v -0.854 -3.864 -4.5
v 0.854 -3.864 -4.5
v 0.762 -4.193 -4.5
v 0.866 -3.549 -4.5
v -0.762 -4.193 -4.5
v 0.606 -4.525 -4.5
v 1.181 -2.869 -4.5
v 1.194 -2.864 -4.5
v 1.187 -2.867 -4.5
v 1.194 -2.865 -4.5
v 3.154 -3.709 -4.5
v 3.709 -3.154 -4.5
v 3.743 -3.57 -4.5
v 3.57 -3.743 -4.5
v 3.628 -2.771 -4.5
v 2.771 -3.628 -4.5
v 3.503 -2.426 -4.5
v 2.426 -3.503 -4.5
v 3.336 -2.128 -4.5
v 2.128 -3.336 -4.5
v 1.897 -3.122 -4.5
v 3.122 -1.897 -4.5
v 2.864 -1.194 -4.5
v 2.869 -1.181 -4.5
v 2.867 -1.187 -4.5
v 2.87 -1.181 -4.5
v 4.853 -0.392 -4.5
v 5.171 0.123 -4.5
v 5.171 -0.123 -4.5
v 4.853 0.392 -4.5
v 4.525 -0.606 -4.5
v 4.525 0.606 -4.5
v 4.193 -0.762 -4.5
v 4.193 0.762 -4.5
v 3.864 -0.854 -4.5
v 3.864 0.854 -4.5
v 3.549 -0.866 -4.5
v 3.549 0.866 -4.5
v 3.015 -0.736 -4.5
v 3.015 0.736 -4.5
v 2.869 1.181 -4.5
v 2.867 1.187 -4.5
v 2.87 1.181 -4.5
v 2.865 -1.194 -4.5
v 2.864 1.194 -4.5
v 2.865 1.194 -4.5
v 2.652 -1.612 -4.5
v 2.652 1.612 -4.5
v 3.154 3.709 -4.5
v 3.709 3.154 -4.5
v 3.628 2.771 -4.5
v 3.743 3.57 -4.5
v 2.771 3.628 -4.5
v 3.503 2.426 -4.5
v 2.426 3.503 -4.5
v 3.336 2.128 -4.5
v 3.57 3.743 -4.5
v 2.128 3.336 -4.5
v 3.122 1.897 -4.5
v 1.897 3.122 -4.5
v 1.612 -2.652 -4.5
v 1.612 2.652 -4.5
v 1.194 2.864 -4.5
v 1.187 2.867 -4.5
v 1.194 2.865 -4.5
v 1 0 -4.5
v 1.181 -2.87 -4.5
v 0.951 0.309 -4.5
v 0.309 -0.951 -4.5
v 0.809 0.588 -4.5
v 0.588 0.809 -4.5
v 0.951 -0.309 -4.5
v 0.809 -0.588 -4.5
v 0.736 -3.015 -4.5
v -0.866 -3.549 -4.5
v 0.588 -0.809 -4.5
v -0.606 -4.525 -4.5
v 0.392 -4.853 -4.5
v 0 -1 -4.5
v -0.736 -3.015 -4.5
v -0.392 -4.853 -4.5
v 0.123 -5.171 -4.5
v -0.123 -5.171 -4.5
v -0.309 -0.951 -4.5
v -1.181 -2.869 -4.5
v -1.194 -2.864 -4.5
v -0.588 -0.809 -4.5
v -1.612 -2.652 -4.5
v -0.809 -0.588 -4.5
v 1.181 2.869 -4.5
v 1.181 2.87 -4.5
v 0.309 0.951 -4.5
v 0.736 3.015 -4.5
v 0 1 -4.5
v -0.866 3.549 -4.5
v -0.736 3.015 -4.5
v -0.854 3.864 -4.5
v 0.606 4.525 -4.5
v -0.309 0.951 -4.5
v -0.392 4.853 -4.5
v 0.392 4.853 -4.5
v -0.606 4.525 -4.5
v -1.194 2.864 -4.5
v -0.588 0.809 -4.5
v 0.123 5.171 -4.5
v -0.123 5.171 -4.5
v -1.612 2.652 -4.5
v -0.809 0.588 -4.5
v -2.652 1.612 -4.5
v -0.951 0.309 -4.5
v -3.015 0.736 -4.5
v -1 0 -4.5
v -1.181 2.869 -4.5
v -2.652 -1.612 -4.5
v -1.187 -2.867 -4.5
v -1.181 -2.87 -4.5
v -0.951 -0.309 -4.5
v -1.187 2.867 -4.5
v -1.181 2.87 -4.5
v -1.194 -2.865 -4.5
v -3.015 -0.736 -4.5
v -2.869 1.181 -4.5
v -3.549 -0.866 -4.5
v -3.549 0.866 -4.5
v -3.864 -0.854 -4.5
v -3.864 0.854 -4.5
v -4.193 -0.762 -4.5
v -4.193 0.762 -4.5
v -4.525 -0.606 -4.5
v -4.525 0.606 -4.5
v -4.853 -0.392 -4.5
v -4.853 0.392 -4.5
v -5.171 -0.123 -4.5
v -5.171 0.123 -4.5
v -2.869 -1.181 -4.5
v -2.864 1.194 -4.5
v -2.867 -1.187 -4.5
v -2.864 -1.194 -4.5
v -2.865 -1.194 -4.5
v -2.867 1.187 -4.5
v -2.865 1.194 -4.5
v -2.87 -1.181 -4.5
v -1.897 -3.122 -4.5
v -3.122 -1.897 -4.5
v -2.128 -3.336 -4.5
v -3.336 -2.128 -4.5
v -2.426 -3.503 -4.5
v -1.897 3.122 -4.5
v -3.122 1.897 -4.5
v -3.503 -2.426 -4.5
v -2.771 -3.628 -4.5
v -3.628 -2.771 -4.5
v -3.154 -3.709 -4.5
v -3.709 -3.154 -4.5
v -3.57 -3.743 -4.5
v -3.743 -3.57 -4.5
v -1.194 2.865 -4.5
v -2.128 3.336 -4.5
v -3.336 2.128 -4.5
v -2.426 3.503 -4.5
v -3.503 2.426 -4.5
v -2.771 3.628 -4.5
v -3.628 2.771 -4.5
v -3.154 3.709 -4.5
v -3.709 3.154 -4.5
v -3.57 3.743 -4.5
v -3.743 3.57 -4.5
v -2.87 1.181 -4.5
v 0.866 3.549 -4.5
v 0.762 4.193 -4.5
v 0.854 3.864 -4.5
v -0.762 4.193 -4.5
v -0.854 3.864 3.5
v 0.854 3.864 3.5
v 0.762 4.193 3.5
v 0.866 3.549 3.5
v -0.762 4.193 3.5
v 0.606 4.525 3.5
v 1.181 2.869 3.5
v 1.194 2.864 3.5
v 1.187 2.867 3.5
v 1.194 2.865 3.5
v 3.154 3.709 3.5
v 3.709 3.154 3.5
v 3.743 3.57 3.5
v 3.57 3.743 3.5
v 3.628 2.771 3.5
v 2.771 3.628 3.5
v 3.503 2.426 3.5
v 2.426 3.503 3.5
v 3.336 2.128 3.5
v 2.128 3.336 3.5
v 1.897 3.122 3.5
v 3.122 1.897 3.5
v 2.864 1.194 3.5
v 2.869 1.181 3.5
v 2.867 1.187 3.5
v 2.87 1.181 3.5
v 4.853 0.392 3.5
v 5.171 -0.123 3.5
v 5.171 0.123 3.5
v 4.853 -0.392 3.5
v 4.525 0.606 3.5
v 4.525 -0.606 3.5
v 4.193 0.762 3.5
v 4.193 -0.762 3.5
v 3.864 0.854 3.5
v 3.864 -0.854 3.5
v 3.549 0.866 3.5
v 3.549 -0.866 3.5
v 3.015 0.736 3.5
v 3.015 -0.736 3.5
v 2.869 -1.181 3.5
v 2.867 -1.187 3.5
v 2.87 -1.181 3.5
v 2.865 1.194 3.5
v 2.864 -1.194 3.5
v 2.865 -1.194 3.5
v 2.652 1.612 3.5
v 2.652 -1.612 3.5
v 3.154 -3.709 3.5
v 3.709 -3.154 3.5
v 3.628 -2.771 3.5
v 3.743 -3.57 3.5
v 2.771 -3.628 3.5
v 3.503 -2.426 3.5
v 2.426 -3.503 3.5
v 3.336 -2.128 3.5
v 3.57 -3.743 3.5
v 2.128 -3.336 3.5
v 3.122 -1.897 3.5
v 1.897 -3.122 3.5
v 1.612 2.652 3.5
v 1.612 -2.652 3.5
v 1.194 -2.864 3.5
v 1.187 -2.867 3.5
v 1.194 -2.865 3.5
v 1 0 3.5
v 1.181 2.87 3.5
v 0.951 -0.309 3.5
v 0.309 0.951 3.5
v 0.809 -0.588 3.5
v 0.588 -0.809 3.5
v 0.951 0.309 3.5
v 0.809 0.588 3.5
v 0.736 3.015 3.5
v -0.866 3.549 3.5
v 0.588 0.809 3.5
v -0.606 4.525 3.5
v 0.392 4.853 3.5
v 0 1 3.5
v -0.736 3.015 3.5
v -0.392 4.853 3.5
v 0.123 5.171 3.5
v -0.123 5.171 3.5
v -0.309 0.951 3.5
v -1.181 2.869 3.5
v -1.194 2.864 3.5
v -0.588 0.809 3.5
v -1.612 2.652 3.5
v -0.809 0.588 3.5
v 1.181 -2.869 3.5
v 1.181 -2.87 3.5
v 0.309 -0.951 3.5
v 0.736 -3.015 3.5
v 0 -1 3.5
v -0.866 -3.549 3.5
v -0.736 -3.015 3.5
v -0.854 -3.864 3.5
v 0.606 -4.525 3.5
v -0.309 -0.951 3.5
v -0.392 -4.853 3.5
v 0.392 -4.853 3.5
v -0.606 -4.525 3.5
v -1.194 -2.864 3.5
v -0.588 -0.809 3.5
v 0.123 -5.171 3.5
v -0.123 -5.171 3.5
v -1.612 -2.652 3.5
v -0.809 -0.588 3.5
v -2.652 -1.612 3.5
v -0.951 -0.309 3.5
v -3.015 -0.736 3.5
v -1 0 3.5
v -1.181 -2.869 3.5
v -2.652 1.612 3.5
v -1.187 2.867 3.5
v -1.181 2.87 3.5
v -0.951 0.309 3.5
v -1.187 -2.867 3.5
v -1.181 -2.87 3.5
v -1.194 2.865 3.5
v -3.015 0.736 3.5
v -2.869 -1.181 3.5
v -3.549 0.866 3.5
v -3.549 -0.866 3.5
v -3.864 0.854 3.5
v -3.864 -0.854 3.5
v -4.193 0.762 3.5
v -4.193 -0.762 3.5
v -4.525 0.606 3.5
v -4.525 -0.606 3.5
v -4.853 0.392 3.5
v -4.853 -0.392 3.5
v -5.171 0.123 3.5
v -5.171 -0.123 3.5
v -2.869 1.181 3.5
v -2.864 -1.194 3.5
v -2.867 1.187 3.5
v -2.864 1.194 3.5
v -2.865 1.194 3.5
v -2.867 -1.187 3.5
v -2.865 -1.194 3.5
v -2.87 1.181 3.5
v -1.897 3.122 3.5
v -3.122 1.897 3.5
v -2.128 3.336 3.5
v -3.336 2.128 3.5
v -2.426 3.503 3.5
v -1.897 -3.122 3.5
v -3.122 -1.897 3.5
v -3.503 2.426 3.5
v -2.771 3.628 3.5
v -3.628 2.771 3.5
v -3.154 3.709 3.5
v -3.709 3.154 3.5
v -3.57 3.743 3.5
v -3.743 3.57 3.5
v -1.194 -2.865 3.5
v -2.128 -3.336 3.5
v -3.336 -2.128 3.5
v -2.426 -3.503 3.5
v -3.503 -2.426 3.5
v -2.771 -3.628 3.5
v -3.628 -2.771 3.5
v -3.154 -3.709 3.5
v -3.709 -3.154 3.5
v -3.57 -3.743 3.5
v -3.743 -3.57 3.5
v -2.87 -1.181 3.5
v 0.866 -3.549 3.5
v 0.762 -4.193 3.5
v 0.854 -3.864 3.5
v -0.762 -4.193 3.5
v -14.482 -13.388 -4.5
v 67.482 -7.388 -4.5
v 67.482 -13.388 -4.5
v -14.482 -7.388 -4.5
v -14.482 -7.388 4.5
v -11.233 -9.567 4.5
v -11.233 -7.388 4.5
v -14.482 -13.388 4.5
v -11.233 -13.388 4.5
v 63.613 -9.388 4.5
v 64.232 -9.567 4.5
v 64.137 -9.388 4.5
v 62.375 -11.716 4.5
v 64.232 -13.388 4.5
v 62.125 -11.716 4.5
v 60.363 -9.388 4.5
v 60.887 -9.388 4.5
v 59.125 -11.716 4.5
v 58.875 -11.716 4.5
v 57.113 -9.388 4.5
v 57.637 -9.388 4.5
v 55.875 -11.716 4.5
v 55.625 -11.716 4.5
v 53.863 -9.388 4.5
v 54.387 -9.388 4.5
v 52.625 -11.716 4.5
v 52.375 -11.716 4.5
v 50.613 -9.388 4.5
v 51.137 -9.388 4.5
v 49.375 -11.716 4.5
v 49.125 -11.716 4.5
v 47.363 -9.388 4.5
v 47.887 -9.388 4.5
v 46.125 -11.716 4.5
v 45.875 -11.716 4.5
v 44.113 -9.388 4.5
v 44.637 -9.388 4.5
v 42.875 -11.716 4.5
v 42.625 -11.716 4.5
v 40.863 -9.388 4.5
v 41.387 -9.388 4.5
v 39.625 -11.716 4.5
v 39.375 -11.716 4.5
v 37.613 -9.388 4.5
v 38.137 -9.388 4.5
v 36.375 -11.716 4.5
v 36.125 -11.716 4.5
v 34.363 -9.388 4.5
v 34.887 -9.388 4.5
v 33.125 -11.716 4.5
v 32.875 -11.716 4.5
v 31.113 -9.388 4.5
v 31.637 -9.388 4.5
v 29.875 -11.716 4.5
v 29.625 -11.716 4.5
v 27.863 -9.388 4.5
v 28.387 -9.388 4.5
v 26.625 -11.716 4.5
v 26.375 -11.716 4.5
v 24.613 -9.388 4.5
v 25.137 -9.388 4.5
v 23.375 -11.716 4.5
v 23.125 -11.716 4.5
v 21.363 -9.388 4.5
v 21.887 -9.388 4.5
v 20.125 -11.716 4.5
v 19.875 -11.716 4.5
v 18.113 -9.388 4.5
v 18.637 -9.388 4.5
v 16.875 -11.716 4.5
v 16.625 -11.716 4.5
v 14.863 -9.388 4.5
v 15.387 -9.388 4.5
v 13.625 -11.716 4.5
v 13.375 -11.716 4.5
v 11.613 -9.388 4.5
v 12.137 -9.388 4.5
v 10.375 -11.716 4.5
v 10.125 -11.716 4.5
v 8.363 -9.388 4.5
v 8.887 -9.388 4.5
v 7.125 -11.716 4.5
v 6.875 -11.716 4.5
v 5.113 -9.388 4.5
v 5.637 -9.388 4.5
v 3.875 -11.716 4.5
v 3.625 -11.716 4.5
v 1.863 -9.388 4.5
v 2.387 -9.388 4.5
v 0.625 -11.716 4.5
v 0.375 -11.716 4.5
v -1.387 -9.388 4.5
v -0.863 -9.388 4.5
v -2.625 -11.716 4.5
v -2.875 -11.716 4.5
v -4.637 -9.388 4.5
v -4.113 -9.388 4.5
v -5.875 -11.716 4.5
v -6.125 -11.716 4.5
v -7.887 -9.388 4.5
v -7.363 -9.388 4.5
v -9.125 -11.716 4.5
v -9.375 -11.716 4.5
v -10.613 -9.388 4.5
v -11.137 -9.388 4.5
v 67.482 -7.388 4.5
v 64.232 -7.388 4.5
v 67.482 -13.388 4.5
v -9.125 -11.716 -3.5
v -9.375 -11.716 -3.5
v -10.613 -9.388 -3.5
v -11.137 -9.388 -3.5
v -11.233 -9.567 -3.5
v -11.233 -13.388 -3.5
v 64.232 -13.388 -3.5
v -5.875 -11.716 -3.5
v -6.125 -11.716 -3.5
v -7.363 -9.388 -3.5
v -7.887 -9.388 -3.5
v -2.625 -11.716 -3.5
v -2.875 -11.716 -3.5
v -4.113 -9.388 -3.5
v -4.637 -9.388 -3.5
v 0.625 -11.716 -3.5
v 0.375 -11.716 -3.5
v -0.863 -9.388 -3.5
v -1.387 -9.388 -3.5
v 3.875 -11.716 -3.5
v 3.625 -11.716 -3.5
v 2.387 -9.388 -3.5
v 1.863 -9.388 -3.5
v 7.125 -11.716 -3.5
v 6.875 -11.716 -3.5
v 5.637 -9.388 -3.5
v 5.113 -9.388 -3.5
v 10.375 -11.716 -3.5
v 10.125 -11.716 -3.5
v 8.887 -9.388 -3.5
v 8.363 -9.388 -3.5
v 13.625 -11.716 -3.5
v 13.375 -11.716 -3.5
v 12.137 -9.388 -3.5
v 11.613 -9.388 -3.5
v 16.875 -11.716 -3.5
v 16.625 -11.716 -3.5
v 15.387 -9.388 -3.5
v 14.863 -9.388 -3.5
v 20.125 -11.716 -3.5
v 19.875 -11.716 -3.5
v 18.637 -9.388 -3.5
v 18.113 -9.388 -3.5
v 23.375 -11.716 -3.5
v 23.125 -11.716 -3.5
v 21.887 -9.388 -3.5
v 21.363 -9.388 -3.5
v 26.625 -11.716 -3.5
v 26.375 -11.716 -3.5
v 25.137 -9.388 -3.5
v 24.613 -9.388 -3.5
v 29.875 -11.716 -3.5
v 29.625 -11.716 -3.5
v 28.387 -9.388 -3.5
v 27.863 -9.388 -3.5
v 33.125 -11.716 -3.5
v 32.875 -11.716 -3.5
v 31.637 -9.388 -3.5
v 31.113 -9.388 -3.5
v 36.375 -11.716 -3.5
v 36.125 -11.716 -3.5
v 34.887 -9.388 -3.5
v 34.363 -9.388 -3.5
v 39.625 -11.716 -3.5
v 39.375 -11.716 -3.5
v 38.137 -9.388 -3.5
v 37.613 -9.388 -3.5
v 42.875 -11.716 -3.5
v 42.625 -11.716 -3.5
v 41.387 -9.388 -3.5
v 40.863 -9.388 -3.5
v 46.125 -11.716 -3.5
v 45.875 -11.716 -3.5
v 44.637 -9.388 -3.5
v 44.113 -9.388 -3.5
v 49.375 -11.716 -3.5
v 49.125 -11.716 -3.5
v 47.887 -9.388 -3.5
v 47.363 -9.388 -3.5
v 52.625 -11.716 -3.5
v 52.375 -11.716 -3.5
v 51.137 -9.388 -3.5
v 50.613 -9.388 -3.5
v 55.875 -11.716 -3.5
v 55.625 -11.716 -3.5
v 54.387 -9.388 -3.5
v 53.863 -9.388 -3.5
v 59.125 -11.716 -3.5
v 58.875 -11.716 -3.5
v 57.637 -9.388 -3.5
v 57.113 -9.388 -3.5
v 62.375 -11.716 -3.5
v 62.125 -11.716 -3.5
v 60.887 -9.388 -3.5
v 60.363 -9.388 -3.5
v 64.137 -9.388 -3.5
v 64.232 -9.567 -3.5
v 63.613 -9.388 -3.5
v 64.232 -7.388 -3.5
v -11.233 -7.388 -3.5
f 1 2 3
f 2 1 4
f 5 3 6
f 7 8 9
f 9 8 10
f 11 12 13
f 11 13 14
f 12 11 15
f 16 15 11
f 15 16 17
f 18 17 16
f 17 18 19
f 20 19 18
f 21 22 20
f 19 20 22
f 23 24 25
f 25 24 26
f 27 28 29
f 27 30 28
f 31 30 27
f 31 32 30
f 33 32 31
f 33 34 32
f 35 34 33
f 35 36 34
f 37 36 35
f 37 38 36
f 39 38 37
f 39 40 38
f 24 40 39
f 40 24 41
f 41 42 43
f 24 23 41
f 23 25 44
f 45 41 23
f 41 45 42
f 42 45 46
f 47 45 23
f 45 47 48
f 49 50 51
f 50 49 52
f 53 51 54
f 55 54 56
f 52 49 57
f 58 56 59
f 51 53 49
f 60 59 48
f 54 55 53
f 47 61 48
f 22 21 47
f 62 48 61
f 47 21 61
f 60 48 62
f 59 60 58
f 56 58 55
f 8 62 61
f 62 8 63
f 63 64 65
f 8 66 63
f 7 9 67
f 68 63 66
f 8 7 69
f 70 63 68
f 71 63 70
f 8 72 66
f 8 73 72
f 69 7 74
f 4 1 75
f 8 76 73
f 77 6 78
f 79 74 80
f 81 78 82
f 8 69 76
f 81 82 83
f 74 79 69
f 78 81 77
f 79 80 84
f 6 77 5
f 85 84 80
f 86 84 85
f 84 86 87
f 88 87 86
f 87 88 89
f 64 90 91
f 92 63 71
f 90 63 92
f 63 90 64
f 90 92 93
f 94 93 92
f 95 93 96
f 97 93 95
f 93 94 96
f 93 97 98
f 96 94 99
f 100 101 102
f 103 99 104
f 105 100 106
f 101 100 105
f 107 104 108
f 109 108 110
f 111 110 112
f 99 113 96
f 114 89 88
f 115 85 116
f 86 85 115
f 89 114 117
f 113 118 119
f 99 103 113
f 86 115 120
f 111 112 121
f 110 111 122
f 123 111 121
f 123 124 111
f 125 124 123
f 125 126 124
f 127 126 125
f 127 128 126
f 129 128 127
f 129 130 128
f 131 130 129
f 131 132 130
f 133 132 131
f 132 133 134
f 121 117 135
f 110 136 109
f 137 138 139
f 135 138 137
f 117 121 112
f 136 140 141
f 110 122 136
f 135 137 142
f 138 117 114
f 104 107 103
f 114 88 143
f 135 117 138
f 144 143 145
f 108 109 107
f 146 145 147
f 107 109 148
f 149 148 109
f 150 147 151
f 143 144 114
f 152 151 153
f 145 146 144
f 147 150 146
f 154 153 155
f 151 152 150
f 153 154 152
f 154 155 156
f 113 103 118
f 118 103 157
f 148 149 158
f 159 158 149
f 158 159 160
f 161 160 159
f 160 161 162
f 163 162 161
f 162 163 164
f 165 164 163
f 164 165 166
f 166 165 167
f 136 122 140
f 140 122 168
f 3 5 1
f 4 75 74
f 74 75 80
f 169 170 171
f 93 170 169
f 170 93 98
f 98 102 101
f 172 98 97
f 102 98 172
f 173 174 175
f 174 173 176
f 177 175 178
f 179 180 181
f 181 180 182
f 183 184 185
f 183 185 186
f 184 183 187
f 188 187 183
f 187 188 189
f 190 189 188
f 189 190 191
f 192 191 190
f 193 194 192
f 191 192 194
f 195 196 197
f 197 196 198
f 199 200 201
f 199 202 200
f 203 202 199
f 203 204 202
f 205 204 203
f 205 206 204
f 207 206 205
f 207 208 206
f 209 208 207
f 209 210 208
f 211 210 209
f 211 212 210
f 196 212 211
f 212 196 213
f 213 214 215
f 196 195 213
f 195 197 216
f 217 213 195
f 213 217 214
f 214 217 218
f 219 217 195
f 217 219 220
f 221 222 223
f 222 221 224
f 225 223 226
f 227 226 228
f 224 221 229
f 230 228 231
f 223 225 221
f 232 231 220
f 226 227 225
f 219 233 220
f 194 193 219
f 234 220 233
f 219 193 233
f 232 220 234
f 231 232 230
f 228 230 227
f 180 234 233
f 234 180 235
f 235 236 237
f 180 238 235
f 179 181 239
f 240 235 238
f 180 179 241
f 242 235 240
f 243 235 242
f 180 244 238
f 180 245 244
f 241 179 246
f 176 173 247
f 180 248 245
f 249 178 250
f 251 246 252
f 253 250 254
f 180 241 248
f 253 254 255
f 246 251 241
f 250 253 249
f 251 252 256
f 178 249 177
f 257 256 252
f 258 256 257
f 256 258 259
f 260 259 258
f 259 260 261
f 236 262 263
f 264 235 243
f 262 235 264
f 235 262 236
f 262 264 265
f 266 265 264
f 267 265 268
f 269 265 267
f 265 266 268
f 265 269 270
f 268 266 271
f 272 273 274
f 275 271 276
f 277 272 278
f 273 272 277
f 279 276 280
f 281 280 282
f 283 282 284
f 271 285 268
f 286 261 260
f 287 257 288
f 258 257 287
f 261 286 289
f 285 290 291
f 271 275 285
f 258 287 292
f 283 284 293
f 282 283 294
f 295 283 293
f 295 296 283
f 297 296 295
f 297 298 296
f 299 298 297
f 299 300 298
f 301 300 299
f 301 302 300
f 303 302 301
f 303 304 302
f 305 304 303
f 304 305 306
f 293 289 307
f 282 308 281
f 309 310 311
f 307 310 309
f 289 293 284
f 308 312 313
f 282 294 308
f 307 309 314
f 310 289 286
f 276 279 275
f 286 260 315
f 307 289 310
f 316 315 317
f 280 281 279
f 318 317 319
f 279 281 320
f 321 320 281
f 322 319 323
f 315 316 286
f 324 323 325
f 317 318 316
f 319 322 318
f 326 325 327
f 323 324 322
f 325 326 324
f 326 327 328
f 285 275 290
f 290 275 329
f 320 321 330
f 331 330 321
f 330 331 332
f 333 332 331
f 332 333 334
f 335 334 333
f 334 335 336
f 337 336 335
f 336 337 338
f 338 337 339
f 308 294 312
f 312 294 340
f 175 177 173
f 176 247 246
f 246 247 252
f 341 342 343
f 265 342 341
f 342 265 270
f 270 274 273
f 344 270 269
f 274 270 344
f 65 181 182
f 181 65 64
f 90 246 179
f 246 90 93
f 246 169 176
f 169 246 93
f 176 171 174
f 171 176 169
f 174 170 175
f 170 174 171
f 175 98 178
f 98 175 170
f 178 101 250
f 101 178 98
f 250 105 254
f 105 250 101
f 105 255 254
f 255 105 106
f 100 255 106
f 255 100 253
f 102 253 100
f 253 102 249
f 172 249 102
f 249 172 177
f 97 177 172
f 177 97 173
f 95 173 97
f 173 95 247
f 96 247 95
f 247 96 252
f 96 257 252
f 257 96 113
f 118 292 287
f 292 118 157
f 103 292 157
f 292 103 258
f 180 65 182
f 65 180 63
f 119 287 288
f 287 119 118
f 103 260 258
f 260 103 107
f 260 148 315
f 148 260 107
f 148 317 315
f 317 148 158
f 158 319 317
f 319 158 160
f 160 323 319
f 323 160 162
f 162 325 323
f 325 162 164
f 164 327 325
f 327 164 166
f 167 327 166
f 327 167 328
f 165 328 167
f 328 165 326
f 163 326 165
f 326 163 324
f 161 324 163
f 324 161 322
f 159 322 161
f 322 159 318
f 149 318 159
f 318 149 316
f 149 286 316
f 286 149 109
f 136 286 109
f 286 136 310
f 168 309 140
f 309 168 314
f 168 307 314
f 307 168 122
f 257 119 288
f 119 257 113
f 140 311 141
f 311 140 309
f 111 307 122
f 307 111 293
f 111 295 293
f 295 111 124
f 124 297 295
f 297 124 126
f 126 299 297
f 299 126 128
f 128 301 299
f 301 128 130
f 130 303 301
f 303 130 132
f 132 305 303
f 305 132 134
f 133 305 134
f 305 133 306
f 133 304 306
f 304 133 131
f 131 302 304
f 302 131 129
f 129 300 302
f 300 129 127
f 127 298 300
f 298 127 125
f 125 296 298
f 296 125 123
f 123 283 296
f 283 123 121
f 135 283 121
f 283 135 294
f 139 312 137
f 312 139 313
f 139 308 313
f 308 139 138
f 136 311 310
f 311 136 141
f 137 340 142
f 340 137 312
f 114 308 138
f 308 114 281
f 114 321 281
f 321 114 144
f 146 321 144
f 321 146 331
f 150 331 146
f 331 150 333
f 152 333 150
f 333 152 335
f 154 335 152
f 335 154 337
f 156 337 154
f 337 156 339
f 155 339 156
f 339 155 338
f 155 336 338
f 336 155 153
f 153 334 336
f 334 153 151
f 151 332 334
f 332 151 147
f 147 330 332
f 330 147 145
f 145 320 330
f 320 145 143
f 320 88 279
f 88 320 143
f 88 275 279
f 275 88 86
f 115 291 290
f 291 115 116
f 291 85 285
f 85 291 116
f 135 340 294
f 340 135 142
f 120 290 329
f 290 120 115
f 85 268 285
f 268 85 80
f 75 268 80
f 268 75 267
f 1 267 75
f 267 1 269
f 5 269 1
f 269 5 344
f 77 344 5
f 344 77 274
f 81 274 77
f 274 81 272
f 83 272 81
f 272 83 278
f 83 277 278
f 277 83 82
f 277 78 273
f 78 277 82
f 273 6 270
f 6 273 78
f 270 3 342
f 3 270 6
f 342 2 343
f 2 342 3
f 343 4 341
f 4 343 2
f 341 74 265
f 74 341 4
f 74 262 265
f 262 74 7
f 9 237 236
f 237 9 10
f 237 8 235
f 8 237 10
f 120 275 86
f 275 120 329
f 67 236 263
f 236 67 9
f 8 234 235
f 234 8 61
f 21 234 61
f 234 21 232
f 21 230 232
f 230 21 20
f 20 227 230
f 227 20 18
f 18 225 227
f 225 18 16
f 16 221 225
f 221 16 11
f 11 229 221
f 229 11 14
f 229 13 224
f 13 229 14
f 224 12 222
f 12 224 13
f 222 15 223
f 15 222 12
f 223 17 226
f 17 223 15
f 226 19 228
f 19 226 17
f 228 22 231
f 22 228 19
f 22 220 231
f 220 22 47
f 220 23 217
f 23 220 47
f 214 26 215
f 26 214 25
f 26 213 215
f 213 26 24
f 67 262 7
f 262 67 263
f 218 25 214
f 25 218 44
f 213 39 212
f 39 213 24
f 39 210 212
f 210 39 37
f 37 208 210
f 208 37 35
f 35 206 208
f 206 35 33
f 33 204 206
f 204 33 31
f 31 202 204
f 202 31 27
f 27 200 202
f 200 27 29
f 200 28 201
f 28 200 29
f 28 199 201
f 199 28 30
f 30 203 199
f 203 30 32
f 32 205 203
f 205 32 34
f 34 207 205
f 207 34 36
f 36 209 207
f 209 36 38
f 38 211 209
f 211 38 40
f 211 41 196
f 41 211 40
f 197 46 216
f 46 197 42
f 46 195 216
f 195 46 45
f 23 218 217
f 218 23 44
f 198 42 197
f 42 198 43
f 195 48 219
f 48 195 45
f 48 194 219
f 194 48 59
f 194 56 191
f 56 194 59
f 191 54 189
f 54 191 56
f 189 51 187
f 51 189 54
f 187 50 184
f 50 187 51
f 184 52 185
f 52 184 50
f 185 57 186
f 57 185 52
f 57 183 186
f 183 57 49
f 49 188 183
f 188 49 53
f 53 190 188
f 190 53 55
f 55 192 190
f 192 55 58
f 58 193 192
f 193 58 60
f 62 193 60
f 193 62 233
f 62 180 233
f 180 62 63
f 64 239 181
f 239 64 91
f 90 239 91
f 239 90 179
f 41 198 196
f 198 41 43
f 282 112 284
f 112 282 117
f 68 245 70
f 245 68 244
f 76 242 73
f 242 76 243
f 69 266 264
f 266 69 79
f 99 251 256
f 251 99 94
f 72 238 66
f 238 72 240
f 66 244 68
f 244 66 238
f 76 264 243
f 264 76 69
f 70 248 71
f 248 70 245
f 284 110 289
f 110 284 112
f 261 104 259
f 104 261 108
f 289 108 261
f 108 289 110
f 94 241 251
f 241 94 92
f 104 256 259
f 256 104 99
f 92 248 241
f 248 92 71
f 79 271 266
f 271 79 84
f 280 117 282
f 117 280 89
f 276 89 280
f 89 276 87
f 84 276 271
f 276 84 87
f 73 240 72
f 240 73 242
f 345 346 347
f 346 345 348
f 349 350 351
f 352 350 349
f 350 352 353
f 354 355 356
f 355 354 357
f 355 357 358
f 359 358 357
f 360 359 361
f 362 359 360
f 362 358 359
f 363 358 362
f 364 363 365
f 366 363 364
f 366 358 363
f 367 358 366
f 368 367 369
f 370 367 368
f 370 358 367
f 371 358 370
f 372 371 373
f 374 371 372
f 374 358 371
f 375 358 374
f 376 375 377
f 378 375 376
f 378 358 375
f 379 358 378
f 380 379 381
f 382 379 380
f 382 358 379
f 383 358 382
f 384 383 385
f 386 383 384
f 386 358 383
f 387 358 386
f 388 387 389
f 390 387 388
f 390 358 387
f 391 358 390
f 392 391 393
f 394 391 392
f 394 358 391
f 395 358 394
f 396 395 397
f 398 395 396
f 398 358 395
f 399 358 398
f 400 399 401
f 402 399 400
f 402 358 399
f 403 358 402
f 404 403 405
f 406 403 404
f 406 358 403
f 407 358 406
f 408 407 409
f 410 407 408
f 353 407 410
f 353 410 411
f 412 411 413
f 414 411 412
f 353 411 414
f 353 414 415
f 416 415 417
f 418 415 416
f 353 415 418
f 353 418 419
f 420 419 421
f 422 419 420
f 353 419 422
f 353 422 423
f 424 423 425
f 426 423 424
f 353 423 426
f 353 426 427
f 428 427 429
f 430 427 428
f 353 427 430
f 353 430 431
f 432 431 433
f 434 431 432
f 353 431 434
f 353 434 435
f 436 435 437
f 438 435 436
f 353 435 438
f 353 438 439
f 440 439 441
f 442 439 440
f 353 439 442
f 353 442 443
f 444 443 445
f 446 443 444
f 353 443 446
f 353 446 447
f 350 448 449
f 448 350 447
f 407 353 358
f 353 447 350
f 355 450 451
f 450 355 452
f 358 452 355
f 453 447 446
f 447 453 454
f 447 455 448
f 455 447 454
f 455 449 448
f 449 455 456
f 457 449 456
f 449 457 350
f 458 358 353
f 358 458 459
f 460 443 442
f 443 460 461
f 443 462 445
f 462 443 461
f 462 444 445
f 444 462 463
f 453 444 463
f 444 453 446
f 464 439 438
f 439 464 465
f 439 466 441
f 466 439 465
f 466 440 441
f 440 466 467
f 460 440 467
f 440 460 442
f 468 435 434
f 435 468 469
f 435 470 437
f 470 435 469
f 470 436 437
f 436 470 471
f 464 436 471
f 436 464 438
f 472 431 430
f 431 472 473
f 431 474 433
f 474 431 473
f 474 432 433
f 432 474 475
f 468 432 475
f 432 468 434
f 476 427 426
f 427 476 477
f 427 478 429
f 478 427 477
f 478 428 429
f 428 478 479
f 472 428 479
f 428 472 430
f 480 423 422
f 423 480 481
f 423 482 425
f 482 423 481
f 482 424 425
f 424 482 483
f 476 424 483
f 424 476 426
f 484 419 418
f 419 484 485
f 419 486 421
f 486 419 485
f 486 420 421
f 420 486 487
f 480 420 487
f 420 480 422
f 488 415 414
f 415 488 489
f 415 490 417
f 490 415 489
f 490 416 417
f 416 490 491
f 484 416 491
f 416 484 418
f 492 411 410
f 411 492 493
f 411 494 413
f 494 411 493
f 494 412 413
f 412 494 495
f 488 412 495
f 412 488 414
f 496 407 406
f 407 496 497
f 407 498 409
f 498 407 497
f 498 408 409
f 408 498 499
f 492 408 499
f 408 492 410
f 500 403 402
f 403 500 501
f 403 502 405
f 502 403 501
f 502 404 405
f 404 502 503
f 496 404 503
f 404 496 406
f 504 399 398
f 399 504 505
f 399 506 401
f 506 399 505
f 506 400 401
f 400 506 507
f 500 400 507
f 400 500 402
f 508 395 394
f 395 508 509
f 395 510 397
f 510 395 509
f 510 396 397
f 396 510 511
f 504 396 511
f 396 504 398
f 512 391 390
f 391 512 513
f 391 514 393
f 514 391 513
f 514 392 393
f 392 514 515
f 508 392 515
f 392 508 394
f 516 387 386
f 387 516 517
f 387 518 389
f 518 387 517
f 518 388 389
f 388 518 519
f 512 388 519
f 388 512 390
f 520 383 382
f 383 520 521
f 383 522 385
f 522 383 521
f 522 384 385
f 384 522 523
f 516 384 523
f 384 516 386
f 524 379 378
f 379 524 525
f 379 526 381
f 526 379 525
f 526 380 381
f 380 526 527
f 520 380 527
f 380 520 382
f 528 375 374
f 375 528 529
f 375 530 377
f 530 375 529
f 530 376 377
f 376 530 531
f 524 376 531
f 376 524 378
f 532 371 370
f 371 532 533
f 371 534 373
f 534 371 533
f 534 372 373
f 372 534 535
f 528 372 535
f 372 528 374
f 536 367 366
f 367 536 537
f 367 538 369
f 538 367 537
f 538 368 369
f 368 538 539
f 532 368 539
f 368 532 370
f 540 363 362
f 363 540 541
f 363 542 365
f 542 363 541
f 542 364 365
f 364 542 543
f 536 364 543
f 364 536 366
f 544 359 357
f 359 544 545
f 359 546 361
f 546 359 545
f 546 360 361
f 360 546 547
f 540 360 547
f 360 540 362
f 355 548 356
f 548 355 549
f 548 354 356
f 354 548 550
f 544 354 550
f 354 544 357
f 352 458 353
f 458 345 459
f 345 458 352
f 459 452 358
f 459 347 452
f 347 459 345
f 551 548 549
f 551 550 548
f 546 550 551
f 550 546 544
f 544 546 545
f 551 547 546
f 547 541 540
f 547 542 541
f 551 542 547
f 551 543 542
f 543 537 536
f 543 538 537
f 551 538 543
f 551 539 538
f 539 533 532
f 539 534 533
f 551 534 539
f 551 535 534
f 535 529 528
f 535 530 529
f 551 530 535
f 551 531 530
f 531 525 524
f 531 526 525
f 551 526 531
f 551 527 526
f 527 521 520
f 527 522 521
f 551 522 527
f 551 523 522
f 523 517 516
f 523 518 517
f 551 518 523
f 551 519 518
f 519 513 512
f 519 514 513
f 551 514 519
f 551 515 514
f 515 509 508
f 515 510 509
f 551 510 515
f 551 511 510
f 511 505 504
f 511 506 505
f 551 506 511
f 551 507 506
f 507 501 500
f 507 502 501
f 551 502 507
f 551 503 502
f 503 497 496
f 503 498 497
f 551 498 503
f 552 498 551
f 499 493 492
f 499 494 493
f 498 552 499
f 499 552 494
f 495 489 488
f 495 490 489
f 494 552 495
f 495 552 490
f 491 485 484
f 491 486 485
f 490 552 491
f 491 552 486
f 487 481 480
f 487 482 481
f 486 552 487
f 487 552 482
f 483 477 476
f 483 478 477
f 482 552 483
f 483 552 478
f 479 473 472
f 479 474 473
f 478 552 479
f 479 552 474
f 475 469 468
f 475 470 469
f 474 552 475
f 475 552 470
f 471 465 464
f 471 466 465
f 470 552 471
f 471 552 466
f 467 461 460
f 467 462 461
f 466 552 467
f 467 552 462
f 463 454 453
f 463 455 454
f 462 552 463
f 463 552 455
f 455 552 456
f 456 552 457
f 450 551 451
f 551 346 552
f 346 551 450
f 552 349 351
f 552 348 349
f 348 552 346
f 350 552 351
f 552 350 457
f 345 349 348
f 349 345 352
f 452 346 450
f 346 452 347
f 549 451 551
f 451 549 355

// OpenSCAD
//This is a modification of " Public Domain Parametric Involute Spur Gear (and involute helical gear and involute rack)
// by Leemon Baird, 2011, Leemon@Leemon.com
//http://www.thingiverse.com/thing:5505  "

//Modifications by racatack June 2016:
// v1.0, 6/24/16:
//  -Incorporated 'module InvoluteGear_rack()' from the 11/11/15 comment by quisam2342 in thing:5505 to fix noted problems in rack generation at various tooth sizes
//  -Added a section for an optional 'backboard' that can be used to stiffen an otherwise skinny rack
//  -Added sections for optional Stop Blocks at either or both ends of a rack
//  -Removed extra gears from the example since I only need one pinion. See thing:5505 example section to gain more insight into gear generation.
//v1.1, 6/28/16:
//  -Added sections to optionally create mounting flanges on the bottom/backside of the rack. Flanges can be at either or both ends, or longitudinal.

//TO GENERATE A CUSTOM RACK AND PINION ENTER INPUTS AT LINES 345-377


//////////////////////////////////////////////////////////////////////////////////////////////
// Public Domain Parametric Involute Spur Gear (and involute helical gear and involute rack)
// version 1.1
// by Leemon Baird, 2011, Leemon@Leemon.com
//http://www.thingiverse.com/thing:5505
//
// This file is public domain.  Use it for any purpose, including commercial
// applications.  Attribution would be nice, but is not required.  There is
// no warranty of any kind, including its correctness, usefulness, or safety.
// 
// This is parameterized involute spur (or helical) gear.  It is much simpler and less powerful than
// others on Thingiverse.  But it is public domain.  I implemented it from scratch from the 
// descriptions and equations on Wikipedia and the web, using Mathematica for calculations and testing,
// and I now release it into the public domain.
//
//		http://en.wikipedia.org/wiki/Involute_gear
//		http://en.wikipedia.org/wiki/Gear
//		http://en.wikipedia.org/wiki/List_of_gear_nomenclature
//		http://gtrebaol.free.fr/doc/catia/spur_gear.html
//		http://www.cs.cmu.edu/~rapidproto/mechanisms/chpt7.html
//
// The module gear() gives an involute spur gear, with reasonable defaults for all the parameters.
// Normally, you should just choose the first 4 parameters, and let the rest be default values.
// The module gear() gives a gear in the XY plane, centered on the origin, with one tooth centered on
// the positive Y axis.  The various functions below it take the same parameters, and return various
// measurements for the gear.  The most important is pitch_radius, which tells how far apart to space
// gears that are meshing, and adendum_radius, which gives the size of the region filled by the gear.
// A gear has a "pitch circle", which is an invisible circle that cuts through the middle of each
// tooth (though not the exact center). In order for two gears to mesh, their pitch circles should 
// just touch.  So the distance between their centers should be pitch_radius() for one, plus pitch_radius() 
// for the other, which gives the radii of their pitch circles.
//
// In order for two gears to mesh, they must have the same mm_per_tooth and pressure_angle parameters.  
// mm_per_tooth gives the number of millimeters of arc around the pitch circle covered by one tooth and one
// space between teeth.  The pitch angle controls how flat or bulged the sides of the teeth are.  Common
// values include 14.5 degrees and 20 degrees, and occasionally 25.  Though I've seen 28 recommended for
// plastic gears. Larger numbers bulge out more, giving stronger teeth, so 28 degrees is the default here.
//
// The ratio of number_of_teeth for two meshing gears gives how many times one will make a full 
// revolution when the the other makes one full revolution.  If the two numbers are coprime (i.e. 
// are not both divisible by the same number greater than 1), then every tooth on one gear
// will meet every tooth on the other, for more even wear.  So coprime numbers of teeth are good.
//
// The module rack() gives a rack, which is a bar with teeth.  A rack can mesh with any
// gear that has the same mm_per_tooth and pressure_angle.
//
// Some terminology: 
// The outline of a gear is a smooth circle (the "pitch circle") which has mountains and valleys
// added so it is toothed.  So there is an inner circle (the "root circle") that touches the 
// base of all the teeth, an outer circle that touches the tips of all the teeth,
// and the invisible pitch circle in between them.  There is also a "base circle", which can be smaller than
// all three of the others, which controls the shape of the teeth.  The side of each tooth lies on the path 
// that the end of a string would follow if it were wrapped tightly around the base circle, then slowly unwound.  
// That shape is an "involute", which gives this type of gear its name.
//
//////////////////////////////////////////////////////////////////////////////////////////////

//An involute spur gear, with reasonable defaults for all the parameters.
//Normally, you should just choose the first 4 parameters, and let the rest be default values.
//Meshing gears must match in mm_per_tooth, pressure_angle, and twist,
//and be separated by the sum of their pitch radii, which can be found with pitch_radius().
module gear (
	mm_per_tooth    = 3,    //this is the "circular pitch", the circumference of the pitch circle divided by the number of teeth
	number_of_teeth = 11,   //total number of teeth around the entire perimeter
	thickness       = 6,    //thickness of gear in mm
	hole_diameter   = 3,    //diameter of the hole in the center, in mm
	twist           = 0,    //teeth rotate this many degrees from bottom of gear to top.  360 makes the gear a screw with each thread going around once
	teeth_to_hide   = 0,    //number of teeth to delete to make this only a fraction of a circle
	pressure_angle  = 28,   //Controls how straight or bulged the tooth sides are. In degrees.
	clearance       = 0.0,  //gap between top of a tooth on one gear and bottom of valley on a meshing gear (in millimeters)
	backlash        = 0.0   //gap between two meshing teeth, in the direction along the circumference of the pitch circle
) {
	assign(pi = 3.1415926)
	assign(p  = mm_per_tooth * number_of_teeth / pi / 2)  //radius of pitch circle
	assign(c  = p + mm_per_tooth / pi - clearance)        //radius of outer circle
	assign(b  = p*cos(pressure_angle))                    //radius of base circle
	assign(r  = p-(c-p)-clearance)                        //radius of root circle
	assign(t  = mm_per_tooth/2-backlash/2)                //tooth thickness at pitch circle
	assign(k  = -iang(b, p) - t/2/p/pi*180) {             //angle to where involute meets base circle on each side of tooth
		difference() {
			for (i = [0:number_of_teeth-teeth_to_hide-1] )
				rotate([0,0,i*360/number_of_teeth])
					linear_extrude(height = thickness, center = true, convexity = 10, twist = twist)
						polygon(
							points=[
								[0, -hole_diameter/10],
								polar(r, -181/number_of_teeth),
								polar(r, r<b ? k : -180/number_of_teeth),
								q7(0/5,r,b,c,k, 1),q7(1/5,r,b,c,k, 1),q7(2/5,r,b,c,k, 1),q7(3/5,r,b,c,k, 1),q7(4/5,r,b,c,k, 1),q7(5/5,r,b,c,k, 1),
								q7(5/5,r,b,c,k,-1),q7(4/5,r,b,c,k,-1),q7(3/5,r,b,c,k,-1),q7(2/5,r,b,c,k,-1),q7(1/5,r,b,c,k,-1),q7(0/5,r,b,c,k,-1),
								polar(r, r<b ? -k : 180/number_of_teeth),
								polar(r, 181/number_of_teeth)
							],
 							paths=[[0,1,2,3,4,5,6,7,8,9,10,11,12,13,14,15,16]]
						);
			cylinder(h=2*thickness+1, r=hole_diameter/2, center=true, $fn=20);
		}
	}
};	
//these 4 functions are used by gear
function polar(r,theta)   = r*[sin(theta), cos(theta)];                            //convert polar to cartesian coordinates
function iang(r1,r2)      = sqrt((r2/r1)*(r2/r1) - 1)/3.1415926*180 - acos(r1/r2); //unwind a string this many degrees to go from radius r1 to radius r2
function q7(f,r,b,r2,t,s) = q6(b,s,t,(1-f)*max(b,r)+f*r2);                         //radius a fraction f up the curved side of the tooth 
function q6(b,s,t,d)      = polar(d,s*(iang(b,d)+t));                              //point at radius d on the involute curve

//a rack, which is a straight line with teeth (the same as a segment from a giant gear with a huge number of teeth).
//The "pitch circle" is a line along the X axis.
//module rack (
//	mm_per_tooth    = 3,    //this is the "circular pitch", the circumference of the pitch circle divided by the number //of teeth
//	number_of_teeth = 11,   //total number of teeth along the rack
//	thickness       = 6,    //thickness of rack in mm (affects each tooth)
//	height          = 120,   //height of rack in mm, from tooth top to far side of rack.
//	pressure_angle  = 28,   //Controls how straight or bulged the tooth sides are. In degrees.
//	backlash        = 0.0   //gap between two meshing teeth, in the direction along the circumference of the pitch circle
//) {
//	assign(pi = 3.1415926)
//	assign(a = mm_per_tooth / pi) //addendum
//	assign(t = a*cos(pressure_angle)-1)         //tooth side is tilted so top/bottom corners move this amount
//		for (i = [0:number_of_teeth-1] )
//			translate([i*mm_per_tooth,0,0])
//				linear_extrude(height = thickness, center = true, convexity = 10)
//					polygon(
//						points=[
//							[-mm_per_tooth * 3/4,                 a-height],
//							[-mm_per_tooth * 3/4 - backlash,     -a],
//							[-mm_per_tooth * 1/4 + backlash - t, -a],
//							[-mm_per_tooth * 1/4 + backlash + t,  a],
//							[ mm_per_tooth * 1/4 - backlash - t,  a],
//							[ mm_per_tooth * 1/4 - backlash + t, -a],
//							[ mm_per_tooth * 3/4 + backlash,     -a],
//							[ mm_per_tooth * 3/4,                 a-height],
//						],
//						paths=[[0,1,2,3,4,5,6,7]]
//					);
//};	


  //rac note - This section generates the rack body and teeth. It is from the 11/11/15 comment by quisam2342 in thing:5505 to fix noted problems with rack generation, and replaces the original 'module rack()'
////////////////////////////////////////////////////////////////////////////////////////////////
// The module InvoluteGear_rack() gives a involute gear rack, which is a bar with teeth.
// A rack can mesh with any gear that has the same mm_per_tooth and pressure_angle.
// The "pitch circle" is a line along the X axis.
//
// mm_per_tooth     this is the "circular pitch", the circumference of the pitch circle
//                  divided by the number of teeth
//
// number_of_teeth  total number of teeth along the rack
//
// thickness        thickness of rack in mm
//
// height           height of rack in mm, from tooth top to far side of rack
//
// pressure_angle   controls how straight or bulged the tooth sides are, in degrees
//
// clearance        gap between top of a tooth on one gear and bottom of valley
//                  on a meshing gear, in millimeters
//
// backlash         gap between two meshing teeth, in the direction along the circumference
//                  of the pitch circle
////////////////////////////////////////////////////////////////////////////////////////////////



module InvoluteGear_rack (

   //Default numbers in this section get overridden by numbers in 'example rack and pinion' section, so set your values there.
   
    mm_per_tooth    = 3, //all meshing gears need the same mm_per_tooth 
    number_of_teeth = 11,
    thickness       = 6,
    height          = 4,
    
  //rac - Added variables for backboard, stop blocks and mounting flanges: 
 //set your values in the 'example rack and pinion' section, as defaults given here will be overridden by that section 
    backboard_thickness = 2.0,
    backboard_height = 1.0,
    side_flange_thickness = 0,
    side_flange_height = 0,
    flange_offset = 0, 
    stop_height = backboard_height,
    left_stop_enable = 1, 
    right_stop_enable = 1,
    flange_height = 0,
    left_flange_enable = 1, 
    right_flange_enable = 1,
    
//These defaults are not redefined in the example section:
    pressure_angle  = 28,  //all meshing gears need the same pressure_angle
    clearance       = 0.0,
    backlash        = 0.0

)

{
    // addendum - tooth height above pitch line
    assign(addendum =        module_value(mm_per_tooth) - clearance)

    // dedendum - tooth height below pitch line
    assign(dedendum = 1.25 * module_value(mm_per_tooth)            ) 


    for (i = [0:number_of_teeth-1] )
        translate([(i+0.5)*mm_per_tooth,height-addendum,0])
            linear_extrude(height = thickness, center = true, convexity = 10)  //'height' parameter here is not the same as 'height' parameter of module. Here it effectively is the width or thickness as the rack is extruded from one side-face to the other.
                polygon(
                    points=[
                        [-1/2 * mm_per_tooth,                                              addendum-height],
                        [-1/2 * mm_per_tooth,                                             -dedendum],
                        [-1/4 * mm_per_tooth + backlash - dedendum * tan(pressure_angle), -dedendum],
                        [-1/4 * mm_per_tooth + backlash + addendum * tan(pressure_angle),  addendum],
                        [ 1/4 * mm_per_tooth - backlash - addendum * tan(pressure_angle),  addendum],
                        [ 1/4 * mm_per_tooth - backlash + dedendum * tan(pressure_angle), -dedendum],
                        [ 1/2 * mm_per_tooth,                                             -dedendum],
                        [ 1/2 * mm_per_tooth,                                              addendum-height],
                    ],
                    paths=[[0,1,2,3,4,5,6,7]]
                );

   //rac -added - This section optionally creates a 'stop block' at the left end of the rack
            translate([(-0.11)*mm_per_tooth,0,0.5*(-thickness)])  
            linear_extrude(height = left_stop_enable*thickness, center = false, convexity = 10)
                polygon(
                    points=[
                        [-1/2 * mm_per_tooth,height+stop_height],   //stop_height extends stop block above teeth, change the number to change the extension amount
                        [-1/2 * mm_per_tooth,0],
                        [ 1/2 * mm_per_tooth,0],
                        [ 1/2 * mm_per_tooth,height+stop_height],   //stop_height extends stop block above teeth, change the number to change the extension amount
                    ],
                    paths=[[0,1,2,3]]
                );


    //rac -added - This section optionally creates a 'stop block' at the right end of the rack
            translate([(0.11+number_of_teeth)*mm_per_tooth,0,0.5*(-thickness)])  
            linear_extrude(height = right_stop_enable*thickness, center = false, convexity = 10)
                polygon(
                    points=[
                        [-1/2 * mm_per_tooth,height+stop_height],   //stop_height extends stop block above teeth
                        [-1/2 * mm_per_tooth,0],
                        [ 1/2 * mm_per_tooth,0],
                        [ 1/2 * mm_per_tooth,height+stop_height],   //stop_height extends stop block above teeth
                    ],
                    paths=[[0,1,2,3]]
                );


    //rac -added - This section optionally creates a flange at the left rear of the rack
            translate([(-0.11)*mm_per_tooth,0,0.5*(-thickness)])   
            linear_extrude(height = left_flange_enable*thickness, center = false, convexity = 10)
                polygon(
                    points=[
                        [-1/2 * mm_per_tooth,-flange_height],   //flange_height extends flange beyond rack bottom
                        [-1/2 * mm_per_tooth,0],
                        [ 1/2 * mm_per_tooth,0],
                        [ 1/2 * mm_per_tooth,-flange_height],   //flange_height extends flange beyond rack bottom
                    ],
                    paths=[[0,1,2,3]]
                );



    //rac -added - This section optionally creates a flange at the right rear of the rack
            translate([(0.11+number_of_teeth)*mm_per_tooth,0,0.5*(-thickness)])  
            linear_extrude(height = right_flange_enable*thickness, center = false, convexity = 10)
                polygon(
                    points=[
                        [-1/2 * mm_per_tooth,-flange_height],   //flange_height extends flange beyond rack bottom
                        [-1/2 * mm_per_tooth,0],
                        [ 1/2 * mm_per_tooth,0],
                        [ 1/2 * mm_per_tooth,-flange_height],   //flange_height extends flange beyond rack bottom
                    ],
                    paths=[[0,1,2,3]]
                );



    //rac -added - This section optionally creates a 'Backboard' on one side of the rack. Can be used to add stiffness for a 'thin' rack (i.e. a rack with low height and/or thickness numbers) or if a large negative height is used it can extend under the rack as a mounting flange.
    for (i = [0:number_of_teeth-1] )
        translate([(i+0.5)*mm_per_tooth,0,0.5*(-thickness+backboard_thickness)])    
        //0.5*(-thickness+backboard_thickness) starts the backboard at one side of the rack and extrudes it inward
            linear_extrude(height = backboard_thickness, center = true, convexity = 10)
                polygon(
                    points=[
                        [-1/2 * mm_per_tooth,height+backboard_height],   //backboard_height extends backboard above teeth
                        [-1/2 * mm_per_tooth,0],

                        [ 1/2 * mm_per_tooth,0],
                        [ 1/2 * mm_per_tooth,height+backboard_height],   //backboard_height extends backboard above teeth
                    ],
                    paths=[[0,1,2,3]]
                );


    //rac -added - This section optionally creates a Rear Side-Flange on along one side of the rack. Can be used to add stiffness for a 'thin' rack (i.e. a rack with low height and/or thickness numbers) or it can be used as a mounting flange.
    for (i = [0:number_of_teeth-1] )
        translate([(i+0.5)*mm_per_tooth,0,0.5*(-thickness+side_flange_thickness)+flange_offset])    
        //0.5*(-side_flange_thickness) starts the backboard at one side of the rack and extrudes it inward. flange_offset moves the flange toward the other side of the rack
            linear_extrude(height = side_flange_thickness, center = true, convexity = 10)
                polygon(
                    points=[
                        [-1/2 * mm_per_tooth,-side_flange_height],   //side_flange_height extends side_flange beyond rack bottom
                        [-1/2 * mm_per_tooth,0],

                        [ 1/2 * mm_per_tooth,0],
                        [ 1/2 * mm_per_tooth,-side_flange_height],   //side_flange_height extends backboard beyond rack bottom
                    ],
                    paths=[[0,1,2,3]]
                );

}


//These 5 functions let the user find the derived dimensions of the gear.
//A gear fits within a circle of radius outer_radius, and two gears should have
//their centers separated by the sum of their pictch_radius.
function circular_pitch  (mm_per_tooth=3) = mm_per_tooth;                     //tooth density expressed as "circular pitch" in millimeters
function diametral_pitch (mm_per_tooth=3) = 3.1415926 / mm_per_tooth;         //tooth density expressed as "diametral pitch" in teeth per millimeter
function module_value    (mm_per_tooth=3) = mm_per_tooth / 3.1415926;                //tooth density expressed as "module" or "modulus" in millimeters
function pitch_radius    (mm_per_tooth=3,number_of_teeth=11) = mm_per_tooth * number_of_teeth / 3.1415926 / 2;
function outer_radius    (mm_per_tooth=3,number_of_teeth=11,clearance=0.1)    //The gear fits entirely within a cylinder of this radius.
	= mm_per_tooth*(1+number_of_teeth/2)/3.1415926  - clearance;              





//////////////////////////////////////////////////////////////////////////////////////////////

//GENERATE A RACK AND PINION 
//ENTER YOUR VALUES HERE: (not in defaults of InvoluteGear_rack() or gear() modules)

//The variable names can be confusing - experiment! Change something then click the dotted cube with Fast-Forward arrows.

//example rack and pinion:
//all distances in mm
n1 = 8; //red gear number of teeth. Set to zero if you don't want to print a pinion.
n5 = 24;  //gray rack number of teeth.  Set to 1 if you don't want to print a rack- that's as small as it gets (you'll get 2 teeth if you set it to zero... I haven't tried to determine why that happens)
mm_per_tooth = 3.25;
thickness    = 9;  // depth of the rack from side-to-side, including backboard if any. The pinion will be this depth minus the backboard_thickness
hole         = 2;   //hole diameter in pinion gear
height       = 4;  // distance from bottom of the rack to the tips of the teeth

//rac-Added - Set your values here for  a Backboard along one side of the teeth.
backboard_thickness = 1.0; //set to zero for no backboard
    backboard_height = 2;   //set to zero for top of backboard to be even with tips of teeth, a positive number will extend above the teeth by the chosen amount. Negative number will place the top of the backboard lower than the teeth.

//rac-Added - Set your values here for a rear Side-Flange along one side of the teeth extending to the rear of the rack (opposite the direction of a backboard).
side_flange_thickness = 0; //set to zero for no rear Side-Flange
    side_flange_height = 10; // A positive number extends the side-flange beyond the bottom of the rack the by specified amount.
    flange_offset = 0; //Set to zero for a flange running coplanar with one side of the teeth. A positive number moves the flange toward other side of the teeth

//rac-Added - Set your values here for Stop Blocks at one or both ends.
stop_height = 2; //Stop Blocks will extend this much above the teeth. A positive number will extend above the teeth by the chosen amount. Negative number will place the top of the block lower than the teeth. 
    left_stop_enable = 1;  //set to 1 to generate Left Stop Block, set to 0 to disable
    right_stop_enable = 1;  //set to 1 to generate Right Stop Block, set to 0 to disable

//rac-Added - Set your values here for rear End-Flanges at one or both ends.    
flange_height = 2.25; //Flanges will extend this much from the bottom of the rack. ****Combine with 0 height Stop Blocks to effectively start flanges at top of tooth instead of backside.****
    left_flange_enable = 0;  //set to 1 to generate Left Rear Flange, set to 0 to disable. 
    right_flange_enable = 0;  //set to 1 to generate Right Rear Flange, set to 0 to disable.
//end of inputs -------------------------------------------------------

d1 =pitch_radius(mm_per_tooth,n1);

//Generation of pinion gear:
translate([ 0,    0, -.5*backboard_thickness]) rotate([0,0, $t*360/n1])                 color([1.00,0.75,0.75]) gear(mm_per_tooth,n1,(thickness-backboard_thickness),hole); //rac -RE above: 'thickness-backboard_thickness' is used here to reduce gear thickness for backboard on rack, The '-.5*backboard_thickness' in translate puts gear bottom even with rack bottom

//Generation of rack, and Relative positioning of gear and rack:
translate([(-floor(n5/2)-floor(n1/2)+$t+n1/2-1/2), -height-backboard_height-d1-mm_per_tooth, 0]) rotate([0,0,0]) color([0.75,0.75,0.75]) InvoluteGear_rack(mm_per_tooth,n5,thickness,height,backboard_thickness,backboard_height,side_flange_thickness,side_flange_height,flange_offset,stop_height,left_stop_enable,right_stop_enable,flange_height,left_flange_enable,right_flange_enable);   //rac - In the above 'translate' instruction, the middle parameter sets spacing between the rack and the pinion. I've set it to '-height-backboard_height-d1-mm_per_tooth' to give a proportionate offset that allows for ease of printing for most sets of gear & rack parameters. If you use a large NEGATIVE backboard height THE GEAR AND RACK MAY OVERLAP. That can be fixed by substituting some other number/formula for '-height-backboard_height-d1-mm_per_tooth'. Try for example -3*d1, or just subtract an additional fixed offset from what's in there now (e.g. (-height-backboard_height-d1-mm_per_tooth)-14.)

//end of example rack and pinion 
//////////////////////////////////////////////////////////////////////////////////////////////////
